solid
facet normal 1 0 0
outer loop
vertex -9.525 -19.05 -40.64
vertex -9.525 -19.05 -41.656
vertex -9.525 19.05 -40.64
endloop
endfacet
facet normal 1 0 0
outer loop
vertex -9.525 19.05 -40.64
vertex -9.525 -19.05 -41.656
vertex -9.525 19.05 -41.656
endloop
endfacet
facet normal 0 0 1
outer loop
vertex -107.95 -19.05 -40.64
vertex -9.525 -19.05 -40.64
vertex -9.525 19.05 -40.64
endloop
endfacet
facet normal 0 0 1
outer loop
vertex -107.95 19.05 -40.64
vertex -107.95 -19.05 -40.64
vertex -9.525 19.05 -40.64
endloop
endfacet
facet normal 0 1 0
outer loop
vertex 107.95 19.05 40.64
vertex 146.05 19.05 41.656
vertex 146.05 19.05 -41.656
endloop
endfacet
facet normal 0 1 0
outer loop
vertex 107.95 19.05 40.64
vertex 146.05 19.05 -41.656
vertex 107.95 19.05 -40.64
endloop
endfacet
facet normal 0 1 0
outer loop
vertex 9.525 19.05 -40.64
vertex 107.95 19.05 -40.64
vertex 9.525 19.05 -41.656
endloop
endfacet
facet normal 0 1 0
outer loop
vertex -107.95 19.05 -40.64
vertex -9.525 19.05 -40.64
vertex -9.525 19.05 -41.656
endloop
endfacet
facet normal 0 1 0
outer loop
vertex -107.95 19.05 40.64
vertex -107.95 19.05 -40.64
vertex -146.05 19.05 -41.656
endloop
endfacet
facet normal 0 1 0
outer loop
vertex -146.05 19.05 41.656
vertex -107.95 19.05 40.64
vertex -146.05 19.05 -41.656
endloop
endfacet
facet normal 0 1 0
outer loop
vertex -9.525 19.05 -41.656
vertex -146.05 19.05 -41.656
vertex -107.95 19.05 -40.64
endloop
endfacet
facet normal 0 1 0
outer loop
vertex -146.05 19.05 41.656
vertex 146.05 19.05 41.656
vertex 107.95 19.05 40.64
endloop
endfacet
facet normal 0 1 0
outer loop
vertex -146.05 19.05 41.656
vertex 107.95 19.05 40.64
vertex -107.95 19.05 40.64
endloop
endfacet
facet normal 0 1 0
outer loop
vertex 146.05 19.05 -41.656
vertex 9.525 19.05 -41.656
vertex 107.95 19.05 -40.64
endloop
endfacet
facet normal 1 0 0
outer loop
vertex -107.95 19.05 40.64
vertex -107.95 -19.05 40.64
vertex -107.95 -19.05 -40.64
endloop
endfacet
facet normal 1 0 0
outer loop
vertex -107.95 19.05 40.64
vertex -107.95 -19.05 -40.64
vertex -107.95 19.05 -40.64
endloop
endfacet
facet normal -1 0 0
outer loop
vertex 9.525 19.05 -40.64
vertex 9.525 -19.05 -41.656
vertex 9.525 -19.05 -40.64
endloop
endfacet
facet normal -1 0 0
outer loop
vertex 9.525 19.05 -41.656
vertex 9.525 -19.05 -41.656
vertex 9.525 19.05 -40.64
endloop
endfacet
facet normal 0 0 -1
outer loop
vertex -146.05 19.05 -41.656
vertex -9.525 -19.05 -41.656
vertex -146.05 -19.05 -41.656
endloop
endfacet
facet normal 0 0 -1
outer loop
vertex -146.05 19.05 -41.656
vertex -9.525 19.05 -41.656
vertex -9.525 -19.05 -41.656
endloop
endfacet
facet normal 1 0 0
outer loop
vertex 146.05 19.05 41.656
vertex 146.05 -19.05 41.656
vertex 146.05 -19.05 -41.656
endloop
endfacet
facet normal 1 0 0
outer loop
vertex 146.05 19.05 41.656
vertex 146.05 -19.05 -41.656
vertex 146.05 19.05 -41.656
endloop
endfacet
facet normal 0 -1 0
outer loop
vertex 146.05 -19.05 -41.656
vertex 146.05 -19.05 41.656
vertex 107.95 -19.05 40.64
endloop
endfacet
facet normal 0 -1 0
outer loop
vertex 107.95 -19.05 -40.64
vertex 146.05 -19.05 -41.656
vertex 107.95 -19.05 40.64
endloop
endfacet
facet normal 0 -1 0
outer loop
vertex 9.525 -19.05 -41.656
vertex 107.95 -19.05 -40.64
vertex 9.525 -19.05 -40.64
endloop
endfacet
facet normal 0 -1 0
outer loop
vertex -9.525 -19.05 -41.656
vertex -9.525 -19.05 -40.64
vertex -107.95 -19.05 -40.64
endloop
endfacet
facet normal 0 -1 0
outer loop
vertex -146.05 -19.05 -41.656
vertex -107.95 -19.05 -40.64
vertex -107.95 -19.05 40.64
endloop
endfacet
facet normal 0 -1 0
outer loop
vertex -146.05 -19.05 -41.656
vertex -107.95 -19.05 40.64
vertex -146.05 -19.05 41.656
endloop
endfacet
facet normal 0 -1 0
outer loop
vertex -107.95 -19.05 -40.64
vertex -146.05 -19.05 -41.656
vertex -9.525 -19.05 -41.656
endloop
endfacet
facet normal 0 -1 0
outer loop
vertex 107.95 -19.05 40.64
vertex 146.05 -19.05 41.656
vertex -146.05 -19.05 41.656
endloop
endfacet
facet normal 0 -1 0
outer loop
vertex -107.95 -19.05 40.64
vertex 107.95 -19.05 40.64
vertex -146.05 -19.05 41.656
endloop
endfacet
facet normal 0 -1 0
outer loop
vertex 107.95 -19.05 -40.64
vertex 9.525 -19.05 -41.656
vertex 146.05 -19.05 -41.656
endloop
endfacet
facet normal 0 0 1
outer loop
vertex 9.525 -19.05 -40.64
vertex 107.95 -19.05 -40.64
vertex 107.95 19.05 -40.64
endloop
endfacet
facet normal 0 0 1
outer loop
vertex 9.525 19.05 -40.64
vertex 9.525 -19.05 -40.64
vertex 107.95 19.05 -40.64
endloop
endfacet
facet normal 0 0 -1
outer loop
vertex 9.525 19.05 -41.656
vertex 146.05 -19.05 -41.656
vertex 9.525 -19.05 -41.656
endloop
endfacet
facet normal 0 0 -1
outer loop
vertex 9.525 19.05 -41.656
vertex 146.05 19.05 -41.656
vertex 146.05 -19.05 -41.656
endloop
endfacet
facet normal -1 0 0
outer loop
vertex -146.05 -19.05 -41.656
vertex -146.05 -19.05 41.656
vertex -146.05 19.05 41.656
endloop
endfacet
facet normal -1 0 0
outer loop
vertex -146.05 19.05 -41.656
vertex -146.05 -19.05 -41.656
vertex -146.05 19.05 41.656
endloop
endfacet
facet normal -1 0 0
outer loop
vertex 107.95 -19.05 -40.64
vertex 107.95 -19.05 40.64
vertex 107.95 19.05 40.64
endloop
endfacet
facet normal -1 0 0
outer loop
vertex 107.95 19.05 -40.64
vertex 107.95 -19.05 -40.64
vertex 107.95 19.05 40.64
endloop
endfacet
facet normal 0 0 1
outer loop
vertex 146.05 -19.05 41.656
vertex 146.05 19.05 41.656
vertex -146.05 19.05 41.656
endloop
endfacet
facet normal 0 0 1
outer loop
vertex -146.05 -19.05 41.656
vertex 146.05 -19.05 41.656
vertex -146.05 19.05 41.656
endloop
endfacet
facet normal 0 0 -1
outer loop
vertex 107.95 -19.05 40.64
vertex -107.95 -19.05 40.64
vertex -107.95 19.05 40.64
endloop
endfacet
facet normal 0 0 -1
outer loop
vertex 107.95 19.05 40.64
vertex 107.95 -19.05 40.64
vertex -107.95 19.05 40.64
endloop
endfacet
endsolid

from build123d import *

# Parameters (mm, degrees)
SKETCH1_W             = 1.016
SKETCH1_H             = 38.1
BOSS_EXTRUDE2_DEPTH   = 107.95
BOSS_EXTRUDE2_2_DEPTH = 107.95
SKETCH2_W             = 38.1
SKETCH2_H             = 38.1
BOSS_EXTRUDE3_DEPTH   = 83.312
CUT_EXTRUDE1_REACH    = 85.312
SKETCH3_W             = 19.05
SKETCH3_H             = 38.1


with BuildPart() as part:
    # Sketch1 → Boss-Extrude2 (new body, symmetric)
    with BuildSketch(Plane(origin=(0, 0, 0), x_dir=(0, 0, -1), z_dir=(1, 0, 0))):
        with Locations((41.148, 0)):
            Rectangle(SKETCH1_W, SKETCH1_H)
    extrude(amount=BOSS_EXTRUDE2_DEPTH, both=True)



with BuildPart() as body_2:
    # Sketch1 → Boss-Extrude2 2 (new body, symmetric)
    with BuildSketch(Plane(origin=(0, 0, 0), x_dir=(0, 0, -1), z_dir=(1, 0, 0))):
        with Locations((-41.148, 0)):
            Rectangle(SKETCH1_W, SKETCH1_H)
    extrude(amount=BOSS_EXTRUDE2_2_DEPTH, both=True)


with BuildPart() as part_1:
    add(part.part)

    add(body_2.part)  # Boss-Extrude3 merges body 2
    # Sketch2 → Boss-Extrude3 (add)
    with BuildSketch(Plane.XY.offset(41.656)):
        with Locations((127, 0)):
            Rectangle(SKETCH2_W, SKETCH2_H)
    boss_extrude3 = extrude(amount=-BOSS_EXTRUDE3_DEPTH)

    # Mirror4: Boss-Extrude3 across plane
    add(boss_extrude3.mirror(Plane(origin=(0, 0, 0), x_dir=(0, 0, 1), z_dir=(1, 0, 0))))

    # Sketch3 → Cut-Extrude1 (cut, up to next)
    with BuildSketch(Plane(origin=(0, 0, -41.656), x_dir=(-1, 0, 0), z_dir=(0, 0, -1)), mode=Mode.PRIVATE) as cut_extrude1_sk1:
        Rectangle(SKETCH3_W, SKETCH3_H)
    cut_extrude1_tool1 = extrude(cut_extrude1_sk1.sketch, amount=-CUT_EXTRUDE1_REACH, mode=Mode.PRIVATE) & part_1.part
    add(cut_extrude1_tool1.solids().sort_by_distance((0, 0, -41.656))[0], mode=Mode.SUBTRACT)


solid = part_1.part
